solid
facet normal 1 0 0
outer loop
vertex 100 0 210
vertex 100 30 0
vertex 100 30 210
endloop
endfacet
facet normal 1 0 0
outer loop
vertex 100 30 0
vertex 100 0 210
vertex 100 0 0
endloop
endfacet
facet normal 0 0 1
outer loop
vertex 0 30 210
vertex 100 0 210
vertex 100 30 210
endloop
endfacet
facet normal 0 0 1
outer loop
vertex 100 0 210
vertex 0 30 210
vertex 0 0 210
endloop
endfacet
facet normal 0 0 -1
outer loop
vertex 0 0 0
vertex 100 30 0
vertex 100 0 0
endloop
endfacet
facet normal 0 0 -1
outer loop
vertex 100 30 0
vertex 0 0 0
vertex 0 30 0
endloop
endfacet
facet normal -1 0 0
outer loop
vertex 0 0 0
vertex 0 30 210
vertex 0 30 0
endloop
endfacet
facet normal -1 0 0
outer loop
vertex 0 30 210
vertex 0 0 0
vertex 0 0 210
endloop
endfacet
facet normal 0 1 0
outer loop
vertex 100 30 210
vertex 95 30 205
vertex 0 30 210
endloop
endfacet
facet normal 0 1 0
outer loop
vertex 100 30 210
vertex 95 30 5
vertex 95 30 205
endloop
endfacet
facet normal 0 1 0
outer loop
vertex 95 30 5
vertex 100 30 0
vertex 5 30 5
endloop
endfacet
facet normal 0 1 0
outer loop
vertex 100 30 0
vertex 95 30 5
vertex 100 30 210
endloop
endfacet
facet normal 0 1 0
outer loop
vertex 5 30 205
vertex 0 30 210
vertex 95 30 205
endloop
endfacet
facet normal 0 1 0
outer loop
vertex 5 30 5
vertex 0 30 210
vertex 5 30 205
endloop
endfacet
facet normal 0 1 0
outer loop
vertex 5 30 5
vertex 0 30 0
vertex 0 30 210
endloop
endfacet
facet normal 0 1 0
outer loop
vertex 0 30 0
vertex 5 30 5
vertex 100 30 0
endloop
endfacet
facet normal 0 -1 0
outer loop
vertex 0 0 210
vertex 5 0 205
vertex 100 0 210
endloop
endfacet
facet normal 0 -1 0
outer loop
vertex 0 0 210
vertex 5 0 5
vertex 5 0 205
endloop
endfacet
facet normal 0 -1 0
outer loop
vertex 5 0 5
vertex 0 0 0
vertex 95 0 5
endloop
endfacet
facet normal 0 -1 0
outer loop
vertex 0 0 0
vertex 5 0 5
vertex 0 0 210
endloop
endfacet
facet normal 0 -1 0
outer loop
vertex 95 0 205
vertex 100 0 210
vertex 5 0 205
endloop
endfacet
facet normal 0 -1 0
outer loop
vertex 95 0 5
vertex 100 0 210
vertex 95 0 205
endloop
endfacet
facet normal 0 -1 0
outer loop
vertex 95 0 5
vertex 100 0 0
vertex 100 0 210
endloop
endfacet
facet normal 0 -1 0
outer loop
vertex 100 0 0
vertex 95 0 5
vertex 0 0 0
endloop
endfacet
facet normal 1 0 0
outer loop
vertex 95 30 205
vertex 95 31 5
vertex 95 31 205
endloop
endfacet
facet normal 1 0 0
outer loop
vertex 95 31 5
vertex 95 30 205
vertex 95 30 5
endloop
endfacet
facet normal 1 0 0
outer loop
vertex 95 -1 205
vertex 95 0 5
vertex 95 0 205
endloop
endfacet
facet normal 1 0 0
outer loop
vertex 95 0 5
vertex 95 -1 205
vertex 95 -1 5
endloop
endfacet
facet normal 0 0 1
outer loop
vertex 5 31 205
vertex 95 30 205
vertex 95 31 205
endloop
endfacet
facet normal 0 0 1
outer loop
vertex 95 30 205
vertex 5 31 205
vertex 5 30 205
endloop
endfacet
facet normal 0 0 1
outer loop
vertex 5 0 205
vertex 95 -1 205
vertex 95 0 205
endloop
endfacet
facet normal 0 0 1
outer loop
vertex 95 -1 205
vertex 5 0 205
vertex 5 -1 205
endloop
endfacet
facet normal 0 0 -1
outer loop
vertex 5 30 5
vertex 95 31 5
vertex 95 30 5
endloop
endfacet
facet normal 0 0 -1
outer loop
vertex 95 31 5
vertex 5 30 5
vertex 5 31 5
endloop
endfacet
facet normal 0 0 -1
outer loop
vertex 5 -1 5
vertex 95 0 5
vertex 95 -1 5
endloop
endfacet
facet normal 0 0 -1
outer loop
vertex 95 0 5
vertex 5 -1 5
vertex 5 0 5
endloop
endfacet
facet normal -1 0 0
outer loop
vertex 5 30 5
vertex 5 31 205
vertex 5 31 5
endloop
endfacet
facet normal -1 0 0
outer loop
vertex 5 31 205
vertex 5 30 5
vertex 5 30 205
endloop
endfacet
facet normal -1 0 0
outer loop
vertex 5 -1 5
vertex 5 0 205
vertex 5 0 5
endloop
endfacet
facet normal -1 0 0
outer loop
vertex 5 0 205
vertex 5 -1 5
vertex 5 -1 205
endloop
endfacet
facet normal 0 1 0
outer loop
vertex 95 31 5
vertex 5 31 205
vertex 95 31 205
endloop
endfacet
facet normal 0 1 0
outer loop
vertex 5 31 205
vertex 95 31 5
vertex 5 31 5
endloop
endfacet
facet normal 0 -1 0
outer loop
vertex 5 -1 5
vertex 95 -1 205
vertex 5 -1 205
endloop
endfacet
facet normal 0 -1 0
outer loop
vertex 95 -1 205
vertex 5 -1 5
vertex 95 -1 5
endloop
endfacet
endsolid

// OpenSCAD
module frontDoor(width, height, depth, reveal) {
	blackberry = [ 102/255, 0/255, 102/255 ];
	blackberryLight = [ 160/255, 160/255, 160/255 ];

	union() {
		color(blackberry)
		cube([width, depth, height]);
		
		color(blackberryLight)
		translate([reveal, -1, reveal])
		cube([width - reveal * 2, depth + 2, height - reveal * 2]);
	}
}

frontDoor(100, 210, 30, 5);
